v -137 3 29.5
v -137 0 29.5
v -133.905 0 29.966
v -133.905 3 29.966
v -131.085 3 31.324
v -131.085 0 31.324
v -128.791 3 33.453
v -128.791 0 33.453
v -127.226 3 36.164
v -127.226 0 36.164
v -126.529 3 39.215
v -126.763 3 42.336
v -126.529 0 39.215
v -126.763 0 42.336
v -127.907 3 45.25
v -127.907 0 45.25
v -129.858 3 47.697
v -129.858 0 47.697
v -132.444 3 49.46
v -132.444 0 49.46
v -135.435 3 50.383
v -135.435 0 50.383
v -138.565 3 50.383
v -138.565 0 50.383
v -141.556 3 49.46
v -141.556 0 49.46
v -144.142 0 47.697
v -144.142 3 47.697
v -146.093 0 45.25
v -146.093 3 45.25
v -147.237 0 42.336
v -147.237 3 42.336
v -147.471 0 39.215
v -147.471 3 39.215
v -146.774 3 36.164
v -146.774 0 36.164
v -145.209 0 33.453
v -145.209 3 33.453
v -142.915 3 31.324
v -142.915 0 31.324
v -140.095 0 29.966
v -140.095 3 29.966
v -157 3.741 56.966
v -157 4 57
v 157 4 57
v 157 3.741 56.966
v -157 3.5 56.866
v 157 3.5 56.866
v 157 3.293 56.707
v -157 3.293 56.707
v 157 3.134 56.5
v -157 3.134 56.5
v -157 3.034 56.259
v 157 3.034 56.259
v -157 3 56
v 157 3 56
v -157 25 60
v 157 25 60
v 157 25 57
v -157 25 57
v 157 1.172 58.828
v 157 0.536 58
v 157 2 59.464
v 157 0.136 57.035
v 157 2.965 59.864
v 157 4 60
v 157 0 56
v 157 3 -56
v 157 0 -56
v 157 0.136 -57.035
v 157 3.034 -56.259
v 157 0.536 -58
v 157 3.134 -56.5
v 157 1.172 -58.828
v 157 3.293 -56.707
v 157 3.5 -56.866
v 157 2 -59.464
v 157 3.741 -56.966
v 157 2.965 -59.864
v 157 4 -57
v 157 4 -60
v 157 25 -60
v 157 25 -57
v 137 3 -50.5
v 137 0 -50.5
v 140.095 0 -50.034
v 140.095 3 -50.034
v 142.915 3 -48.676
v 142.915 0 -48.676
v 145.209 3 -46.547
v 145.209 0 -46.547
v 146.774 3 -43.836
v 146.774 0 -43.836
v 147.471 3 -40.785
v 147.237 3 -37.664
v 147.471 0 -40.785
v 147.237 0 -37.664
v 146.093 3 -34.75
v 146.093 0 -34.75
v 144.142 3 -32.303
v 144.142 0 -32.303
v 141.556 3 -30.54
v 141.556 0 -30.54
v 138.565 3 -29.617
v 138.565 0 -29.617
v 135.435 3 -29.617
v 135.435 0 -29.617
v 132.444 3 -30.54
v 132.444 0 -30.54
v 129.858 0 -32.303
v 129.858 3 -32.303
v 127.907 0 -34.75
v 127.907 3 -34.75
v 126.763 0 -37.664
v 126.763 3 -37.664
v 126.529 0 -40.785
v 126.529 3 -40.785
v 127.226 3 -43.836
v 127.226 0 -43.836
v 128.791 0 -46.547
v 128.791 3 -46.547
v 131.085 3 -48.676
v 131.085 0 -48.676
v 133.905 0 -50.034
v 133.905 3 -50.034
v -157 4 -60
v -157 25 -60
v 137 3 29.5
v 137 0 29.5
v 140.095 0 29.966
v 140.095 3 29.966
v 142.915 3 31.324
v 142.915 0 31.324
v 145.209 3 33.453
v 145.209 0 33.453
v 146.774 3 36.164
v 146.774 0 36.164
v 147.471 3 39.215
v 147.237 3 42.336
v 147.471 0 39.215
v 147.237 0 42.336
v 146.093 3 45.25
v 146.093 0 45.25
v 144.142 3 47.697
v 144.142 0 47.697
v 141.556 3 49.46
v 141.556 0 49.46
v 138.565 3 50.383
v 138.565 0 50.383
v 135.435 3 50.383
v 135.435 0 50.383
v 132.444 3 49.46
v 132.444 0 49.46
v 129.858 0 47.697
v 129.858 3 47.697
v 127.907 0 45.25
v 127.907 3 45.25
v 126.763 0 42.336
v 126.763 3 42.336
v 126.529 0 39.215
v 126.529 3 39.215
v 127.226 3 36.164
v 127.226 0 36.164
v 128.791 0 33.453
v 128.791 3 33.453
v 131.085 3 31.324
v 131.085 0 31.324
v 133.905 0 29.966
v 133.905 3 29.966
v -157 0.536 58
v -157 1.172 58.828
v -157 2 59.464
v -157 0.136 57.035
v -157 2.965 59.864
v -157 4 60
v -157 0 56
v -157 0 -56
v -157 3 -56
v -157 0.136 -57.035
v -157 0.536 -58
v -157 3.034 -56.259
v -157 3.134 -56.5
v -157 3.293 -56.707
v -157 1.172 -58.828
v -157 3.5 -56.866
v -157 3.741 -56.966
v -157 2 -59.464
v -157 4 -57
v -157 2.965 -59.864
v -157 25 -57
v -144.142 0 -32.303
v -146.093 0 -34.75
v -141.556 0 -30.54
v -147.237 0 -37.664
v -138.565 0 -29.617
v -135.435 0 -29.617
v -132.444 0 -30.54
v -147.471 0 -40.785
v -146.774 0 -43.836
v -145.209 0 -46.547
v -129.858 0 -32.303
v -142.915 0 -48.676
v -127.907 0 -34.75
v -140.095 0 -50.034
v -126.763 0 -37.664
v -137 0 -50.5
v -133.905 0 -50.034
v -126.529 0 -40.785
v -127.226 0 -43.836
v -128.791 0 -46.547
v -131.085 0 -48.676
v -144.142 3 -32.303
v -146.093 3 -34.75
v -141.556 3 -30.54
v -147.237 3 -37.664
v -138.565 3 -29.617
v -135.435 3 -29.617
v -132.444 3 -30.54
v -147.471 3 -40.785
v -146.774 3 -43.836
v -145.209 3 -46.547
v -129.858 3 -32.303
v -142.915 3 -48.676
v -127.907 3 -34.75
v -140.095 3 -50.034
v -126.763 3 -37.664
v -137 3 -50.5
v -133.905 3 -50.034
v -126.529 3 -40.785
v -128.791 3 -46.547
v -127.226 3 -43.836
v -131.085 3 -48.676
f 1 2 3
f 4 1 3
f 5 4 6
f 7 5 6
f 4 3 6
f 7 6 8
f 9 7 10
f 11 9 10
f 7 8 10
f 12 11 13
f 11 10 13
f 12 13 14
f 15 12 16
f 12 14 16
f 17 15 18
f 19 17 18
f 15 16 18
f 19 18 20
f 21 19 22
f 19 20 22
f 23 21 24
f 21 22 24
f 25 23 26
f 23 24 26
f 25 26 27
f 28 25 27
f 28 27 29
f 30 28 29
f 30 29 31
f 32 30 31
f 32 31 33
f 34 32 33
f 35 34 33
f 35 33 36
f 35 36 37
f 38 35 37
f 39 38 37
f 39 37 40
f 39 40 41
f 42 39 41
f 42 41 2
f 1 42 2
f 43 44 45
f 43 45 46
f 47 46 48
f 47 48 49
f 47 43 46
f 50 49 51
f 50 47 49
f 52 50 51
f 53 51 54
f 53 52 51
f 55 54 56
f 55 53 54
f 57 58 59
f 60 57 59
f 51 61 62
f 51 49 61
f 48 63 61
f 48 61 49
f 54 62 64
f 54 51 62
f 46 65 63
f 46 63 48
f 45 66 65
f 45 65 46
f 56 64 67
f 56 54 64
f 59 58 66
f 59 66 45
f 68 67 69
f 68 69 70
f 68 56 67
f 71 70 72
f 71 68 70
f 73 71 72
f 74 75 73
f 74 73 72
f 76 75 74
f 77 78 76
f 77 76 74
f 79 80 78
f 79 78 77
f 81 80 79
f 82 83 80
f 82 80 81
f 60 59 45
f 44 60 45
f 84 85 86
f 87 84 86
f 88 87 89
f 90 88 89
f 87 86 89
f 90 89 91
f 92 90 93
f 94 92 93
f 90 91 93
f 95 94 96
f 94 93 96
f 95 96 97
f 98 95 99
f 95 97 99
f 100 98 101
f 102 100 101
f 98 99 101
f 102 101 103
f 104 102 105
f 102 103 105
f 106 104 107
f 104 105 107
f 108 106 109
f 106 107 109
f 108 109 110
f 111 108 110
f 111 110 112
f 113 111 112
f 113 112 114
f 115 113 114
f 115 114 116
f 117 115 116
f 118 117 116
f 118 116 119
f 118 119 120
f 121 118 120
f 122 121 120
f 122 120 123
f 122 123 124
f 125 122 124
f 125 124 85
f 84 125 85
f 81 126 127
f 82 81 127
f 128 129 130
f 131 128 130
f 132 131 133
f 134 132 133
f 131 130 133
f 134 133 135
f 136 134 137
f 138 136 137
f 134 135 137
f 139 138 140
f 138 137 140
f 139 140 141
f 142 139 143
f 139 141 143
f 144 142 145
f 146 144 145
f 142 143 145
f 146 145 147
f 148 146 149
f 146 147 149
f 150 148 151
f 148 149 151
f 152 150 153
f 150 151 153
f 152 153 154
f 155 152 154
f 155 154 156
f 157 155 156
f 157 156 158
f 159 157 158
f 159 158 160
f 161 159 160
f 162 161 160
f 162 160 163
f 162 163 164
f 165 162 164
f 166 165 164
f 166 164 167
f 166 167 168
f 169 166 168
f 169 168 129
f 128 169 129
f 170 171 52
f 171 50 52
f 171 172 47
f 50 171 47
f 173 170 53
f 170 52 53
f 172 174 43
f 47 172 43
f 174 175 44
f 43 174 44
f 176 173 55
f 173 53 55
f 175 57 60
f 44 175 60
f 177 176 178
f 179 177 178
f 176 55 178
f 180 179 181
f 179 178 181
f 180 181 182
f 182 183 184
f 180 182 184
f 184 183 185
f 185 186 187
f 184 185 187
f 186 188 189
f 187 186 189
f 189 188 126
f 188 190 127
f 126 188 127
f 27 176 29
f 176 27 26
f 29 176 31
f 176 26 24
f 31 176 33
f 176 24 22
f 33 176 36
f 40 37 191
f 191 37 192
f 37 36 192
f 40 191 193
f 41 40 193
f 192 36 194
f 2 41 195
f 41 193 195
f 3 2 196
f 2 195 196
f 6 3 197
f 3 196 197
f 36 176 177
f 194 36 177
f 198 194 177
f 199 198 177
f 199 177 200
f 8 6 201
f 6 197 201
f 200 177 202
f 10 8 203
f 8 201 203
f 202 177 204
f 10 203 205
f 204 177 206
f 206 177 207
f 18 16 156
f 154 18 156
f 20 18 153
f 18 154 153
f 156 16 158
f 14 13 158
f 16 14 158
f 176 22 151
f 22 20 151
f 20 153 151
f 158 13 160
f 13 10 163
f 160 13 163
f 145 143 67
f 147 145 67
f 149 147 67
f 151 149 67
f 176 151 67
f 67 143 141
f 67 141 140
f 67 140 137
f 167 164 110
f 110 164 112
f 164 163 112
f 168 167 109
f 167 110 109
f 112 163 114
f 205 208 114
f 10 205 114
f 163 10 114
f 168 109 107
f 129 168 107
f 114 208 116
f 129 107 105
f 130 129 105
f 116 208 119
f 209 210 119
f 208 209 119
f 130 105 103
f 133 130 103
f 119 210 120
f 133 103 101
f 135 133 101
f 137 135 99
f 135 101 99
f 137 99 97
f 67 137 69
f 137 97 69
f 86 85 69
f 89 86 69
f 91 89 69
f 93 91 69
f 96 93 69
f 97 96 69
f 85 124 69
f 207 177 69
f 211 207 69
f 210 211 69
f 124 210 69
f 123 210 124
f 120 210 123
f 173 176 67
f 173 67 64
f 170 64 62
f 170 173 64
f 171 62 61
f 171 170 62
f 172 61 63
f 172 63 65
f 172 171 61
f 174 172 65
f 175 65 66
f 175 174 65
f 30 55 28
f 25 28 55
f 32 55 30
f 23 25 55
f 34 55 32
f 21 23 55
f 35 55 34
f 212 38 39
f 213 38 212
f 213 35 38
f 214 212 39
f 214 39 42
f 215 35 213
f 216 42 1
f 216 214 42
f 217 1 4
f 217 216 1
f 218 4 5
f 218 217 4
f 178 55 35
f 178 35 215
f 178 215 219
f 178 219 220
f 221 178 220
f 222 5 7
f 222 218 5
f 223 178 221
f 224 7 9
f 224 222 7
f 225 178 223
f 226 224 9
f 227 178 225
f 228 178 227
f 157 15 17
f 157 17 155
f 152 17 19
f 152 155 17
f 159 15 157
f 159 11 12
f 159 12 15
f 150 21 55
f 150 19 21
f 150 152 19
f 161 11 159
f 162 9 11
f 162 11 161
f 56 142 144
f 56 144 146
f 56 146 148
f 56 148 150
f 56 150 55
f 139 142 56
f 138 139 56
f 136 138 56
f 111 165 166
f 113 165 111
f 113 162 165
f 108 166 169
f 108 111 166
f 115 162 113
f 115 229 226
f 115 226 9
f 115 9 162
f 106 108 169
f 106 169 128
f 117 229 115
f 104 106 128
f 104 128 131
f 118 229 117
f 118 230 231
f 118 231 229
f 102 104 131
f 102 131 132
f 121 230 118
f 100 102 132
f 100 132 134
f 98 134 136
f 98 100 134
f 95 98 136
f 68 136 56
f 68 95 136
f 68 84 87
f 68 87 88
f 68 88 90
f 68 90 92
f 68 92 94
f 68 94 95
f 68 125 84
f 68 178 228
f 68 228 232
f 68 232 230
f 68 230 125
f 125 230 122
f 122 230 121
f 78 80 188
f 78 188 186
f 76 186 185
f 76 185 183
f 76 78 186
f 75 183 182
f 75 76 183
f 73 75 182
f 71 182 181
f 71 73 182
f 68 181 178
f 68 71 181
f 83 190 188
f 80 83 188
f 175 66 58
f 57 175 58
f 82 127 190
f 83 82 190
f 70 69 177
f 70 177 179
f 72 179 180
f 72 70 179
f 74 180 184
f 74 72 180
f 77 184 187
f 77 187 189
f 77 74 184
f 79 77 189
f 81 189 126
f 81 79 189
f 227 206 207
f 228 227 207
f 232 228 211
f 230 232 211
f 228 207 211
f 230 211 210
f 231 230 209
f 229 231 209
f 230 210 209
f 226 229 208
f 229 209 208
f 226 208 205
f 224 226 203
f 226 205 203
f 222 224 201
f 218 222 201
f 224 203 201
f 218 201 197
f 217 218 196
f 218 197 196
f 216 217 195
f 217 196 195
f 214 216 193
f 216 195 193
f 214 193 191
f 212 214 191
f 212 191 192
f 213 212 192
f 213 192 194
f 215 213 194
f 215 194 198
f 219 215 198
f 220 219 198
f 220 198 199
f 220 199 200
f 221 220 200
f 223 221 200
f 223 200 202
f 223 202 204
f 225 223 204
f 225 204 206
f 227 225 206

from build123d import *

# Parameters (mm, degrees)
SKETCH1_W                      = 314
SKETCH1_H                      = 114
BOSS_EXTRUDE1_DEPTH            = 3
EDGE_FLANGE1_STRIP_W           = 14
EDGE_FLANGE1_STRIP_H           = 3
EDGE_FLANGE1_STRIP_CUT_DEPTH   = 314
EDGE_FLANGE1_STRIP_2_W         = 14
EDGE_FLANGE1_STRIP_2_H         = 3
EDGE_FLANGE1_STRIP_CUT_2_DEPTH = 314
EDGE_FLANGE1_DEPTH             = 314
EDGE_FLANGE1_BEND_DEPTH        = 314
CUT_EXTRUDE1_REACH             = 171.924
SKETCH16_R                     = 10.5


# Sheet-metal steps are written as plain solids
with BuildPart() as part:
    # Sketch1 → Boss-Extrude1 (new body)
    with BuildSketch(Plane(origin=(0, 0, 0), x_dir=(1, 0, 0), z_dir=(0, 1, 0))):
        Rectangle(SKETCH1_W, SKETCH1_H)
    extrude(amount=BOSS_EXTRUDE1_DEPTH)

    # Edge-Flange1 strip (across the edge) → Edge-Flange1 strip cut (cut)
    with BuildSketch(Plane(origin=(-157, 3, 57), x_dir=(0, 0, -1), z_dir=(1, 0, 0))):
        with Locations((-6, -1.5)):
            Rectangle(EDGE_FLANGE1_STRIP_W, EDGE_FLANGE1_STRIP_H)
    extrude(amount=EDGE_FLANGE1_STRIP_CUT_DEPTH, mode=Mode.SUBTRACT)

    # Edge-Flange1 strip 2 (across the edge) → Edge-Flange1 strip cut 2 (cut)
    with BuildSketch(Plane(origin=(157, 3, -57), x_dir=(0, 0, 1), z_dir=(-1, 0, 0))):
        with Locations((-6, -1.5)):
            Rectangle(EDGE_FLANGE1_STRIP_2_W, EDGE_FLANGE1_STRIP_2_H)
    extrude(amount=EDGE_FLANGE1_STRIP_CUT_2_DEPTH, mode=Mode.SUBTRACT)

    # Edge-Flange1 section (across the edge) → Edge-Flange1 (add)
    with BuildSketch(Plane(origin=(-157, 3, 57), x_dir=(0, 0, -1), z_dir=(1, 0, 0))):
        with BuildLine():
            Line((-3, 1), (-3, 22))
            Line((-3, 22), (0, 22))
            Line((0, 22), (0, 1))
            ThreePointArc((0, 1), (0.292893219, 0.292893219), (1, 0))
            Line((1, 0), (1, -3))
            ThreePointArc((1, -3), (-1.828427125, -1.828427125), (-3, 1))
        make_face()
    extrude(amount=EDGE_FLANGE1_DEPTH)

    # Edge-Flange1 section 2 (across the edge) → Edge-Flange1 bend (add)
    with BuildSketch(Plane(origin=(157, 3, -57), x_dir=(0, 0, 1), z_dir=(-1, 0, 0))):
        with BuildLine():
            Line((-3, 1), (-3, 22))
            Line((-3, 22), (0, 22))
            Line((0, 22), (0, 1))
            ThreePointArc((0, 1), (0.292893219, 0.292893219), (1, 0))
            Line((1, 0), (1, -3))
            ThreePointArc((1, -3), (-1.828427125, -1.828427125), (-3, 1))
        make_face()
    extrude(amount=EDGE_FLANGE1_BEND_DEPTH)

    # Sketch16 → Cut-Extrude1 (cut, up to next)
    with BuildSketch(Plane.XZ, mode=Mode.PRIVATE) as cut_extrude1_sk1:
        with Locations(Location((-137, 40, 0), (0, 0, 270))):
            Circle(SKETCH16_R)
    cut_extrude1_tool1 = extrude(cut_extrude1_sk1.sketch, amount=-CUT_EXTRUDE1_REACH, mode=Mode.PRIVATE) & part.part
    # Sketch16 → Cut-Extrude1 (cut, up to next)
    with BuildSketch(Plane.XZ, mode=Mode.PRIVATE) as cut_extrude1_sk2:
        with Locations(Location((-137, -40, 0), (0, 0, 270))):
            Circle(SKETCH16_R)
    cut_extrude1_tool2 = extrude(cut_extrude1_sk2.sketch, amount=-CUT_EXTRUDE1_REACH, mode=Mode.PRIVATE) & part.part
    # Sketch16 → Cut-Extrude1 (cut, up to next)
    with BuildSketch(Plane.XZ, mode=Mode.PRIVATE) as cut_extrude1_sk3:
        with Locations(Location((137, -40, 0), (0, 0, 270))):
            Circle(SKETCH16_R)
    cut_extrude1_tool3 = extrude(cut_extrude1_sk3.sketch, amount=-CUT_EXTRUDE1_REACH, mode=Mode.PRIVATE) & part.part
    # Sketch16 → Cut-Extrude1 (cut, up to next)
    with BuildSketch(Plane.XZ, mode=Mode.PRIVATE) as cut_extrude1_sk4:
        with Locations(Location((137, 40, 0), (0, 0, 270))):
            Circle(SKETCH16_R)
    cut_extrude1_tool4 = extrude(cut_extrude1_sk4.sketch, amount=-CUT_EXTRUDE1_REACH, mode=Mode.PRIVATE) & part.part
    add(cut_extrude1_tool1.solids().sort_by_distance((-137, 0, 40))[0], mode=Mode.SUBTRACT)
    add(cut_extrude1_tool2.solids().sort_by_distance((-137, 0, -40))[0], mode=Mode.SUBTRACT)
    add(cut_extrude1_tool3.solids().sort_by_distance((137, 0, -40))[0], mode=Mode.SUBTRACT)
    add(cut_extrude1_tool4.solids().sort_by_distance((137, 0, 40))[0], mode=Mode.SUBTRACT)


solid = part.part
